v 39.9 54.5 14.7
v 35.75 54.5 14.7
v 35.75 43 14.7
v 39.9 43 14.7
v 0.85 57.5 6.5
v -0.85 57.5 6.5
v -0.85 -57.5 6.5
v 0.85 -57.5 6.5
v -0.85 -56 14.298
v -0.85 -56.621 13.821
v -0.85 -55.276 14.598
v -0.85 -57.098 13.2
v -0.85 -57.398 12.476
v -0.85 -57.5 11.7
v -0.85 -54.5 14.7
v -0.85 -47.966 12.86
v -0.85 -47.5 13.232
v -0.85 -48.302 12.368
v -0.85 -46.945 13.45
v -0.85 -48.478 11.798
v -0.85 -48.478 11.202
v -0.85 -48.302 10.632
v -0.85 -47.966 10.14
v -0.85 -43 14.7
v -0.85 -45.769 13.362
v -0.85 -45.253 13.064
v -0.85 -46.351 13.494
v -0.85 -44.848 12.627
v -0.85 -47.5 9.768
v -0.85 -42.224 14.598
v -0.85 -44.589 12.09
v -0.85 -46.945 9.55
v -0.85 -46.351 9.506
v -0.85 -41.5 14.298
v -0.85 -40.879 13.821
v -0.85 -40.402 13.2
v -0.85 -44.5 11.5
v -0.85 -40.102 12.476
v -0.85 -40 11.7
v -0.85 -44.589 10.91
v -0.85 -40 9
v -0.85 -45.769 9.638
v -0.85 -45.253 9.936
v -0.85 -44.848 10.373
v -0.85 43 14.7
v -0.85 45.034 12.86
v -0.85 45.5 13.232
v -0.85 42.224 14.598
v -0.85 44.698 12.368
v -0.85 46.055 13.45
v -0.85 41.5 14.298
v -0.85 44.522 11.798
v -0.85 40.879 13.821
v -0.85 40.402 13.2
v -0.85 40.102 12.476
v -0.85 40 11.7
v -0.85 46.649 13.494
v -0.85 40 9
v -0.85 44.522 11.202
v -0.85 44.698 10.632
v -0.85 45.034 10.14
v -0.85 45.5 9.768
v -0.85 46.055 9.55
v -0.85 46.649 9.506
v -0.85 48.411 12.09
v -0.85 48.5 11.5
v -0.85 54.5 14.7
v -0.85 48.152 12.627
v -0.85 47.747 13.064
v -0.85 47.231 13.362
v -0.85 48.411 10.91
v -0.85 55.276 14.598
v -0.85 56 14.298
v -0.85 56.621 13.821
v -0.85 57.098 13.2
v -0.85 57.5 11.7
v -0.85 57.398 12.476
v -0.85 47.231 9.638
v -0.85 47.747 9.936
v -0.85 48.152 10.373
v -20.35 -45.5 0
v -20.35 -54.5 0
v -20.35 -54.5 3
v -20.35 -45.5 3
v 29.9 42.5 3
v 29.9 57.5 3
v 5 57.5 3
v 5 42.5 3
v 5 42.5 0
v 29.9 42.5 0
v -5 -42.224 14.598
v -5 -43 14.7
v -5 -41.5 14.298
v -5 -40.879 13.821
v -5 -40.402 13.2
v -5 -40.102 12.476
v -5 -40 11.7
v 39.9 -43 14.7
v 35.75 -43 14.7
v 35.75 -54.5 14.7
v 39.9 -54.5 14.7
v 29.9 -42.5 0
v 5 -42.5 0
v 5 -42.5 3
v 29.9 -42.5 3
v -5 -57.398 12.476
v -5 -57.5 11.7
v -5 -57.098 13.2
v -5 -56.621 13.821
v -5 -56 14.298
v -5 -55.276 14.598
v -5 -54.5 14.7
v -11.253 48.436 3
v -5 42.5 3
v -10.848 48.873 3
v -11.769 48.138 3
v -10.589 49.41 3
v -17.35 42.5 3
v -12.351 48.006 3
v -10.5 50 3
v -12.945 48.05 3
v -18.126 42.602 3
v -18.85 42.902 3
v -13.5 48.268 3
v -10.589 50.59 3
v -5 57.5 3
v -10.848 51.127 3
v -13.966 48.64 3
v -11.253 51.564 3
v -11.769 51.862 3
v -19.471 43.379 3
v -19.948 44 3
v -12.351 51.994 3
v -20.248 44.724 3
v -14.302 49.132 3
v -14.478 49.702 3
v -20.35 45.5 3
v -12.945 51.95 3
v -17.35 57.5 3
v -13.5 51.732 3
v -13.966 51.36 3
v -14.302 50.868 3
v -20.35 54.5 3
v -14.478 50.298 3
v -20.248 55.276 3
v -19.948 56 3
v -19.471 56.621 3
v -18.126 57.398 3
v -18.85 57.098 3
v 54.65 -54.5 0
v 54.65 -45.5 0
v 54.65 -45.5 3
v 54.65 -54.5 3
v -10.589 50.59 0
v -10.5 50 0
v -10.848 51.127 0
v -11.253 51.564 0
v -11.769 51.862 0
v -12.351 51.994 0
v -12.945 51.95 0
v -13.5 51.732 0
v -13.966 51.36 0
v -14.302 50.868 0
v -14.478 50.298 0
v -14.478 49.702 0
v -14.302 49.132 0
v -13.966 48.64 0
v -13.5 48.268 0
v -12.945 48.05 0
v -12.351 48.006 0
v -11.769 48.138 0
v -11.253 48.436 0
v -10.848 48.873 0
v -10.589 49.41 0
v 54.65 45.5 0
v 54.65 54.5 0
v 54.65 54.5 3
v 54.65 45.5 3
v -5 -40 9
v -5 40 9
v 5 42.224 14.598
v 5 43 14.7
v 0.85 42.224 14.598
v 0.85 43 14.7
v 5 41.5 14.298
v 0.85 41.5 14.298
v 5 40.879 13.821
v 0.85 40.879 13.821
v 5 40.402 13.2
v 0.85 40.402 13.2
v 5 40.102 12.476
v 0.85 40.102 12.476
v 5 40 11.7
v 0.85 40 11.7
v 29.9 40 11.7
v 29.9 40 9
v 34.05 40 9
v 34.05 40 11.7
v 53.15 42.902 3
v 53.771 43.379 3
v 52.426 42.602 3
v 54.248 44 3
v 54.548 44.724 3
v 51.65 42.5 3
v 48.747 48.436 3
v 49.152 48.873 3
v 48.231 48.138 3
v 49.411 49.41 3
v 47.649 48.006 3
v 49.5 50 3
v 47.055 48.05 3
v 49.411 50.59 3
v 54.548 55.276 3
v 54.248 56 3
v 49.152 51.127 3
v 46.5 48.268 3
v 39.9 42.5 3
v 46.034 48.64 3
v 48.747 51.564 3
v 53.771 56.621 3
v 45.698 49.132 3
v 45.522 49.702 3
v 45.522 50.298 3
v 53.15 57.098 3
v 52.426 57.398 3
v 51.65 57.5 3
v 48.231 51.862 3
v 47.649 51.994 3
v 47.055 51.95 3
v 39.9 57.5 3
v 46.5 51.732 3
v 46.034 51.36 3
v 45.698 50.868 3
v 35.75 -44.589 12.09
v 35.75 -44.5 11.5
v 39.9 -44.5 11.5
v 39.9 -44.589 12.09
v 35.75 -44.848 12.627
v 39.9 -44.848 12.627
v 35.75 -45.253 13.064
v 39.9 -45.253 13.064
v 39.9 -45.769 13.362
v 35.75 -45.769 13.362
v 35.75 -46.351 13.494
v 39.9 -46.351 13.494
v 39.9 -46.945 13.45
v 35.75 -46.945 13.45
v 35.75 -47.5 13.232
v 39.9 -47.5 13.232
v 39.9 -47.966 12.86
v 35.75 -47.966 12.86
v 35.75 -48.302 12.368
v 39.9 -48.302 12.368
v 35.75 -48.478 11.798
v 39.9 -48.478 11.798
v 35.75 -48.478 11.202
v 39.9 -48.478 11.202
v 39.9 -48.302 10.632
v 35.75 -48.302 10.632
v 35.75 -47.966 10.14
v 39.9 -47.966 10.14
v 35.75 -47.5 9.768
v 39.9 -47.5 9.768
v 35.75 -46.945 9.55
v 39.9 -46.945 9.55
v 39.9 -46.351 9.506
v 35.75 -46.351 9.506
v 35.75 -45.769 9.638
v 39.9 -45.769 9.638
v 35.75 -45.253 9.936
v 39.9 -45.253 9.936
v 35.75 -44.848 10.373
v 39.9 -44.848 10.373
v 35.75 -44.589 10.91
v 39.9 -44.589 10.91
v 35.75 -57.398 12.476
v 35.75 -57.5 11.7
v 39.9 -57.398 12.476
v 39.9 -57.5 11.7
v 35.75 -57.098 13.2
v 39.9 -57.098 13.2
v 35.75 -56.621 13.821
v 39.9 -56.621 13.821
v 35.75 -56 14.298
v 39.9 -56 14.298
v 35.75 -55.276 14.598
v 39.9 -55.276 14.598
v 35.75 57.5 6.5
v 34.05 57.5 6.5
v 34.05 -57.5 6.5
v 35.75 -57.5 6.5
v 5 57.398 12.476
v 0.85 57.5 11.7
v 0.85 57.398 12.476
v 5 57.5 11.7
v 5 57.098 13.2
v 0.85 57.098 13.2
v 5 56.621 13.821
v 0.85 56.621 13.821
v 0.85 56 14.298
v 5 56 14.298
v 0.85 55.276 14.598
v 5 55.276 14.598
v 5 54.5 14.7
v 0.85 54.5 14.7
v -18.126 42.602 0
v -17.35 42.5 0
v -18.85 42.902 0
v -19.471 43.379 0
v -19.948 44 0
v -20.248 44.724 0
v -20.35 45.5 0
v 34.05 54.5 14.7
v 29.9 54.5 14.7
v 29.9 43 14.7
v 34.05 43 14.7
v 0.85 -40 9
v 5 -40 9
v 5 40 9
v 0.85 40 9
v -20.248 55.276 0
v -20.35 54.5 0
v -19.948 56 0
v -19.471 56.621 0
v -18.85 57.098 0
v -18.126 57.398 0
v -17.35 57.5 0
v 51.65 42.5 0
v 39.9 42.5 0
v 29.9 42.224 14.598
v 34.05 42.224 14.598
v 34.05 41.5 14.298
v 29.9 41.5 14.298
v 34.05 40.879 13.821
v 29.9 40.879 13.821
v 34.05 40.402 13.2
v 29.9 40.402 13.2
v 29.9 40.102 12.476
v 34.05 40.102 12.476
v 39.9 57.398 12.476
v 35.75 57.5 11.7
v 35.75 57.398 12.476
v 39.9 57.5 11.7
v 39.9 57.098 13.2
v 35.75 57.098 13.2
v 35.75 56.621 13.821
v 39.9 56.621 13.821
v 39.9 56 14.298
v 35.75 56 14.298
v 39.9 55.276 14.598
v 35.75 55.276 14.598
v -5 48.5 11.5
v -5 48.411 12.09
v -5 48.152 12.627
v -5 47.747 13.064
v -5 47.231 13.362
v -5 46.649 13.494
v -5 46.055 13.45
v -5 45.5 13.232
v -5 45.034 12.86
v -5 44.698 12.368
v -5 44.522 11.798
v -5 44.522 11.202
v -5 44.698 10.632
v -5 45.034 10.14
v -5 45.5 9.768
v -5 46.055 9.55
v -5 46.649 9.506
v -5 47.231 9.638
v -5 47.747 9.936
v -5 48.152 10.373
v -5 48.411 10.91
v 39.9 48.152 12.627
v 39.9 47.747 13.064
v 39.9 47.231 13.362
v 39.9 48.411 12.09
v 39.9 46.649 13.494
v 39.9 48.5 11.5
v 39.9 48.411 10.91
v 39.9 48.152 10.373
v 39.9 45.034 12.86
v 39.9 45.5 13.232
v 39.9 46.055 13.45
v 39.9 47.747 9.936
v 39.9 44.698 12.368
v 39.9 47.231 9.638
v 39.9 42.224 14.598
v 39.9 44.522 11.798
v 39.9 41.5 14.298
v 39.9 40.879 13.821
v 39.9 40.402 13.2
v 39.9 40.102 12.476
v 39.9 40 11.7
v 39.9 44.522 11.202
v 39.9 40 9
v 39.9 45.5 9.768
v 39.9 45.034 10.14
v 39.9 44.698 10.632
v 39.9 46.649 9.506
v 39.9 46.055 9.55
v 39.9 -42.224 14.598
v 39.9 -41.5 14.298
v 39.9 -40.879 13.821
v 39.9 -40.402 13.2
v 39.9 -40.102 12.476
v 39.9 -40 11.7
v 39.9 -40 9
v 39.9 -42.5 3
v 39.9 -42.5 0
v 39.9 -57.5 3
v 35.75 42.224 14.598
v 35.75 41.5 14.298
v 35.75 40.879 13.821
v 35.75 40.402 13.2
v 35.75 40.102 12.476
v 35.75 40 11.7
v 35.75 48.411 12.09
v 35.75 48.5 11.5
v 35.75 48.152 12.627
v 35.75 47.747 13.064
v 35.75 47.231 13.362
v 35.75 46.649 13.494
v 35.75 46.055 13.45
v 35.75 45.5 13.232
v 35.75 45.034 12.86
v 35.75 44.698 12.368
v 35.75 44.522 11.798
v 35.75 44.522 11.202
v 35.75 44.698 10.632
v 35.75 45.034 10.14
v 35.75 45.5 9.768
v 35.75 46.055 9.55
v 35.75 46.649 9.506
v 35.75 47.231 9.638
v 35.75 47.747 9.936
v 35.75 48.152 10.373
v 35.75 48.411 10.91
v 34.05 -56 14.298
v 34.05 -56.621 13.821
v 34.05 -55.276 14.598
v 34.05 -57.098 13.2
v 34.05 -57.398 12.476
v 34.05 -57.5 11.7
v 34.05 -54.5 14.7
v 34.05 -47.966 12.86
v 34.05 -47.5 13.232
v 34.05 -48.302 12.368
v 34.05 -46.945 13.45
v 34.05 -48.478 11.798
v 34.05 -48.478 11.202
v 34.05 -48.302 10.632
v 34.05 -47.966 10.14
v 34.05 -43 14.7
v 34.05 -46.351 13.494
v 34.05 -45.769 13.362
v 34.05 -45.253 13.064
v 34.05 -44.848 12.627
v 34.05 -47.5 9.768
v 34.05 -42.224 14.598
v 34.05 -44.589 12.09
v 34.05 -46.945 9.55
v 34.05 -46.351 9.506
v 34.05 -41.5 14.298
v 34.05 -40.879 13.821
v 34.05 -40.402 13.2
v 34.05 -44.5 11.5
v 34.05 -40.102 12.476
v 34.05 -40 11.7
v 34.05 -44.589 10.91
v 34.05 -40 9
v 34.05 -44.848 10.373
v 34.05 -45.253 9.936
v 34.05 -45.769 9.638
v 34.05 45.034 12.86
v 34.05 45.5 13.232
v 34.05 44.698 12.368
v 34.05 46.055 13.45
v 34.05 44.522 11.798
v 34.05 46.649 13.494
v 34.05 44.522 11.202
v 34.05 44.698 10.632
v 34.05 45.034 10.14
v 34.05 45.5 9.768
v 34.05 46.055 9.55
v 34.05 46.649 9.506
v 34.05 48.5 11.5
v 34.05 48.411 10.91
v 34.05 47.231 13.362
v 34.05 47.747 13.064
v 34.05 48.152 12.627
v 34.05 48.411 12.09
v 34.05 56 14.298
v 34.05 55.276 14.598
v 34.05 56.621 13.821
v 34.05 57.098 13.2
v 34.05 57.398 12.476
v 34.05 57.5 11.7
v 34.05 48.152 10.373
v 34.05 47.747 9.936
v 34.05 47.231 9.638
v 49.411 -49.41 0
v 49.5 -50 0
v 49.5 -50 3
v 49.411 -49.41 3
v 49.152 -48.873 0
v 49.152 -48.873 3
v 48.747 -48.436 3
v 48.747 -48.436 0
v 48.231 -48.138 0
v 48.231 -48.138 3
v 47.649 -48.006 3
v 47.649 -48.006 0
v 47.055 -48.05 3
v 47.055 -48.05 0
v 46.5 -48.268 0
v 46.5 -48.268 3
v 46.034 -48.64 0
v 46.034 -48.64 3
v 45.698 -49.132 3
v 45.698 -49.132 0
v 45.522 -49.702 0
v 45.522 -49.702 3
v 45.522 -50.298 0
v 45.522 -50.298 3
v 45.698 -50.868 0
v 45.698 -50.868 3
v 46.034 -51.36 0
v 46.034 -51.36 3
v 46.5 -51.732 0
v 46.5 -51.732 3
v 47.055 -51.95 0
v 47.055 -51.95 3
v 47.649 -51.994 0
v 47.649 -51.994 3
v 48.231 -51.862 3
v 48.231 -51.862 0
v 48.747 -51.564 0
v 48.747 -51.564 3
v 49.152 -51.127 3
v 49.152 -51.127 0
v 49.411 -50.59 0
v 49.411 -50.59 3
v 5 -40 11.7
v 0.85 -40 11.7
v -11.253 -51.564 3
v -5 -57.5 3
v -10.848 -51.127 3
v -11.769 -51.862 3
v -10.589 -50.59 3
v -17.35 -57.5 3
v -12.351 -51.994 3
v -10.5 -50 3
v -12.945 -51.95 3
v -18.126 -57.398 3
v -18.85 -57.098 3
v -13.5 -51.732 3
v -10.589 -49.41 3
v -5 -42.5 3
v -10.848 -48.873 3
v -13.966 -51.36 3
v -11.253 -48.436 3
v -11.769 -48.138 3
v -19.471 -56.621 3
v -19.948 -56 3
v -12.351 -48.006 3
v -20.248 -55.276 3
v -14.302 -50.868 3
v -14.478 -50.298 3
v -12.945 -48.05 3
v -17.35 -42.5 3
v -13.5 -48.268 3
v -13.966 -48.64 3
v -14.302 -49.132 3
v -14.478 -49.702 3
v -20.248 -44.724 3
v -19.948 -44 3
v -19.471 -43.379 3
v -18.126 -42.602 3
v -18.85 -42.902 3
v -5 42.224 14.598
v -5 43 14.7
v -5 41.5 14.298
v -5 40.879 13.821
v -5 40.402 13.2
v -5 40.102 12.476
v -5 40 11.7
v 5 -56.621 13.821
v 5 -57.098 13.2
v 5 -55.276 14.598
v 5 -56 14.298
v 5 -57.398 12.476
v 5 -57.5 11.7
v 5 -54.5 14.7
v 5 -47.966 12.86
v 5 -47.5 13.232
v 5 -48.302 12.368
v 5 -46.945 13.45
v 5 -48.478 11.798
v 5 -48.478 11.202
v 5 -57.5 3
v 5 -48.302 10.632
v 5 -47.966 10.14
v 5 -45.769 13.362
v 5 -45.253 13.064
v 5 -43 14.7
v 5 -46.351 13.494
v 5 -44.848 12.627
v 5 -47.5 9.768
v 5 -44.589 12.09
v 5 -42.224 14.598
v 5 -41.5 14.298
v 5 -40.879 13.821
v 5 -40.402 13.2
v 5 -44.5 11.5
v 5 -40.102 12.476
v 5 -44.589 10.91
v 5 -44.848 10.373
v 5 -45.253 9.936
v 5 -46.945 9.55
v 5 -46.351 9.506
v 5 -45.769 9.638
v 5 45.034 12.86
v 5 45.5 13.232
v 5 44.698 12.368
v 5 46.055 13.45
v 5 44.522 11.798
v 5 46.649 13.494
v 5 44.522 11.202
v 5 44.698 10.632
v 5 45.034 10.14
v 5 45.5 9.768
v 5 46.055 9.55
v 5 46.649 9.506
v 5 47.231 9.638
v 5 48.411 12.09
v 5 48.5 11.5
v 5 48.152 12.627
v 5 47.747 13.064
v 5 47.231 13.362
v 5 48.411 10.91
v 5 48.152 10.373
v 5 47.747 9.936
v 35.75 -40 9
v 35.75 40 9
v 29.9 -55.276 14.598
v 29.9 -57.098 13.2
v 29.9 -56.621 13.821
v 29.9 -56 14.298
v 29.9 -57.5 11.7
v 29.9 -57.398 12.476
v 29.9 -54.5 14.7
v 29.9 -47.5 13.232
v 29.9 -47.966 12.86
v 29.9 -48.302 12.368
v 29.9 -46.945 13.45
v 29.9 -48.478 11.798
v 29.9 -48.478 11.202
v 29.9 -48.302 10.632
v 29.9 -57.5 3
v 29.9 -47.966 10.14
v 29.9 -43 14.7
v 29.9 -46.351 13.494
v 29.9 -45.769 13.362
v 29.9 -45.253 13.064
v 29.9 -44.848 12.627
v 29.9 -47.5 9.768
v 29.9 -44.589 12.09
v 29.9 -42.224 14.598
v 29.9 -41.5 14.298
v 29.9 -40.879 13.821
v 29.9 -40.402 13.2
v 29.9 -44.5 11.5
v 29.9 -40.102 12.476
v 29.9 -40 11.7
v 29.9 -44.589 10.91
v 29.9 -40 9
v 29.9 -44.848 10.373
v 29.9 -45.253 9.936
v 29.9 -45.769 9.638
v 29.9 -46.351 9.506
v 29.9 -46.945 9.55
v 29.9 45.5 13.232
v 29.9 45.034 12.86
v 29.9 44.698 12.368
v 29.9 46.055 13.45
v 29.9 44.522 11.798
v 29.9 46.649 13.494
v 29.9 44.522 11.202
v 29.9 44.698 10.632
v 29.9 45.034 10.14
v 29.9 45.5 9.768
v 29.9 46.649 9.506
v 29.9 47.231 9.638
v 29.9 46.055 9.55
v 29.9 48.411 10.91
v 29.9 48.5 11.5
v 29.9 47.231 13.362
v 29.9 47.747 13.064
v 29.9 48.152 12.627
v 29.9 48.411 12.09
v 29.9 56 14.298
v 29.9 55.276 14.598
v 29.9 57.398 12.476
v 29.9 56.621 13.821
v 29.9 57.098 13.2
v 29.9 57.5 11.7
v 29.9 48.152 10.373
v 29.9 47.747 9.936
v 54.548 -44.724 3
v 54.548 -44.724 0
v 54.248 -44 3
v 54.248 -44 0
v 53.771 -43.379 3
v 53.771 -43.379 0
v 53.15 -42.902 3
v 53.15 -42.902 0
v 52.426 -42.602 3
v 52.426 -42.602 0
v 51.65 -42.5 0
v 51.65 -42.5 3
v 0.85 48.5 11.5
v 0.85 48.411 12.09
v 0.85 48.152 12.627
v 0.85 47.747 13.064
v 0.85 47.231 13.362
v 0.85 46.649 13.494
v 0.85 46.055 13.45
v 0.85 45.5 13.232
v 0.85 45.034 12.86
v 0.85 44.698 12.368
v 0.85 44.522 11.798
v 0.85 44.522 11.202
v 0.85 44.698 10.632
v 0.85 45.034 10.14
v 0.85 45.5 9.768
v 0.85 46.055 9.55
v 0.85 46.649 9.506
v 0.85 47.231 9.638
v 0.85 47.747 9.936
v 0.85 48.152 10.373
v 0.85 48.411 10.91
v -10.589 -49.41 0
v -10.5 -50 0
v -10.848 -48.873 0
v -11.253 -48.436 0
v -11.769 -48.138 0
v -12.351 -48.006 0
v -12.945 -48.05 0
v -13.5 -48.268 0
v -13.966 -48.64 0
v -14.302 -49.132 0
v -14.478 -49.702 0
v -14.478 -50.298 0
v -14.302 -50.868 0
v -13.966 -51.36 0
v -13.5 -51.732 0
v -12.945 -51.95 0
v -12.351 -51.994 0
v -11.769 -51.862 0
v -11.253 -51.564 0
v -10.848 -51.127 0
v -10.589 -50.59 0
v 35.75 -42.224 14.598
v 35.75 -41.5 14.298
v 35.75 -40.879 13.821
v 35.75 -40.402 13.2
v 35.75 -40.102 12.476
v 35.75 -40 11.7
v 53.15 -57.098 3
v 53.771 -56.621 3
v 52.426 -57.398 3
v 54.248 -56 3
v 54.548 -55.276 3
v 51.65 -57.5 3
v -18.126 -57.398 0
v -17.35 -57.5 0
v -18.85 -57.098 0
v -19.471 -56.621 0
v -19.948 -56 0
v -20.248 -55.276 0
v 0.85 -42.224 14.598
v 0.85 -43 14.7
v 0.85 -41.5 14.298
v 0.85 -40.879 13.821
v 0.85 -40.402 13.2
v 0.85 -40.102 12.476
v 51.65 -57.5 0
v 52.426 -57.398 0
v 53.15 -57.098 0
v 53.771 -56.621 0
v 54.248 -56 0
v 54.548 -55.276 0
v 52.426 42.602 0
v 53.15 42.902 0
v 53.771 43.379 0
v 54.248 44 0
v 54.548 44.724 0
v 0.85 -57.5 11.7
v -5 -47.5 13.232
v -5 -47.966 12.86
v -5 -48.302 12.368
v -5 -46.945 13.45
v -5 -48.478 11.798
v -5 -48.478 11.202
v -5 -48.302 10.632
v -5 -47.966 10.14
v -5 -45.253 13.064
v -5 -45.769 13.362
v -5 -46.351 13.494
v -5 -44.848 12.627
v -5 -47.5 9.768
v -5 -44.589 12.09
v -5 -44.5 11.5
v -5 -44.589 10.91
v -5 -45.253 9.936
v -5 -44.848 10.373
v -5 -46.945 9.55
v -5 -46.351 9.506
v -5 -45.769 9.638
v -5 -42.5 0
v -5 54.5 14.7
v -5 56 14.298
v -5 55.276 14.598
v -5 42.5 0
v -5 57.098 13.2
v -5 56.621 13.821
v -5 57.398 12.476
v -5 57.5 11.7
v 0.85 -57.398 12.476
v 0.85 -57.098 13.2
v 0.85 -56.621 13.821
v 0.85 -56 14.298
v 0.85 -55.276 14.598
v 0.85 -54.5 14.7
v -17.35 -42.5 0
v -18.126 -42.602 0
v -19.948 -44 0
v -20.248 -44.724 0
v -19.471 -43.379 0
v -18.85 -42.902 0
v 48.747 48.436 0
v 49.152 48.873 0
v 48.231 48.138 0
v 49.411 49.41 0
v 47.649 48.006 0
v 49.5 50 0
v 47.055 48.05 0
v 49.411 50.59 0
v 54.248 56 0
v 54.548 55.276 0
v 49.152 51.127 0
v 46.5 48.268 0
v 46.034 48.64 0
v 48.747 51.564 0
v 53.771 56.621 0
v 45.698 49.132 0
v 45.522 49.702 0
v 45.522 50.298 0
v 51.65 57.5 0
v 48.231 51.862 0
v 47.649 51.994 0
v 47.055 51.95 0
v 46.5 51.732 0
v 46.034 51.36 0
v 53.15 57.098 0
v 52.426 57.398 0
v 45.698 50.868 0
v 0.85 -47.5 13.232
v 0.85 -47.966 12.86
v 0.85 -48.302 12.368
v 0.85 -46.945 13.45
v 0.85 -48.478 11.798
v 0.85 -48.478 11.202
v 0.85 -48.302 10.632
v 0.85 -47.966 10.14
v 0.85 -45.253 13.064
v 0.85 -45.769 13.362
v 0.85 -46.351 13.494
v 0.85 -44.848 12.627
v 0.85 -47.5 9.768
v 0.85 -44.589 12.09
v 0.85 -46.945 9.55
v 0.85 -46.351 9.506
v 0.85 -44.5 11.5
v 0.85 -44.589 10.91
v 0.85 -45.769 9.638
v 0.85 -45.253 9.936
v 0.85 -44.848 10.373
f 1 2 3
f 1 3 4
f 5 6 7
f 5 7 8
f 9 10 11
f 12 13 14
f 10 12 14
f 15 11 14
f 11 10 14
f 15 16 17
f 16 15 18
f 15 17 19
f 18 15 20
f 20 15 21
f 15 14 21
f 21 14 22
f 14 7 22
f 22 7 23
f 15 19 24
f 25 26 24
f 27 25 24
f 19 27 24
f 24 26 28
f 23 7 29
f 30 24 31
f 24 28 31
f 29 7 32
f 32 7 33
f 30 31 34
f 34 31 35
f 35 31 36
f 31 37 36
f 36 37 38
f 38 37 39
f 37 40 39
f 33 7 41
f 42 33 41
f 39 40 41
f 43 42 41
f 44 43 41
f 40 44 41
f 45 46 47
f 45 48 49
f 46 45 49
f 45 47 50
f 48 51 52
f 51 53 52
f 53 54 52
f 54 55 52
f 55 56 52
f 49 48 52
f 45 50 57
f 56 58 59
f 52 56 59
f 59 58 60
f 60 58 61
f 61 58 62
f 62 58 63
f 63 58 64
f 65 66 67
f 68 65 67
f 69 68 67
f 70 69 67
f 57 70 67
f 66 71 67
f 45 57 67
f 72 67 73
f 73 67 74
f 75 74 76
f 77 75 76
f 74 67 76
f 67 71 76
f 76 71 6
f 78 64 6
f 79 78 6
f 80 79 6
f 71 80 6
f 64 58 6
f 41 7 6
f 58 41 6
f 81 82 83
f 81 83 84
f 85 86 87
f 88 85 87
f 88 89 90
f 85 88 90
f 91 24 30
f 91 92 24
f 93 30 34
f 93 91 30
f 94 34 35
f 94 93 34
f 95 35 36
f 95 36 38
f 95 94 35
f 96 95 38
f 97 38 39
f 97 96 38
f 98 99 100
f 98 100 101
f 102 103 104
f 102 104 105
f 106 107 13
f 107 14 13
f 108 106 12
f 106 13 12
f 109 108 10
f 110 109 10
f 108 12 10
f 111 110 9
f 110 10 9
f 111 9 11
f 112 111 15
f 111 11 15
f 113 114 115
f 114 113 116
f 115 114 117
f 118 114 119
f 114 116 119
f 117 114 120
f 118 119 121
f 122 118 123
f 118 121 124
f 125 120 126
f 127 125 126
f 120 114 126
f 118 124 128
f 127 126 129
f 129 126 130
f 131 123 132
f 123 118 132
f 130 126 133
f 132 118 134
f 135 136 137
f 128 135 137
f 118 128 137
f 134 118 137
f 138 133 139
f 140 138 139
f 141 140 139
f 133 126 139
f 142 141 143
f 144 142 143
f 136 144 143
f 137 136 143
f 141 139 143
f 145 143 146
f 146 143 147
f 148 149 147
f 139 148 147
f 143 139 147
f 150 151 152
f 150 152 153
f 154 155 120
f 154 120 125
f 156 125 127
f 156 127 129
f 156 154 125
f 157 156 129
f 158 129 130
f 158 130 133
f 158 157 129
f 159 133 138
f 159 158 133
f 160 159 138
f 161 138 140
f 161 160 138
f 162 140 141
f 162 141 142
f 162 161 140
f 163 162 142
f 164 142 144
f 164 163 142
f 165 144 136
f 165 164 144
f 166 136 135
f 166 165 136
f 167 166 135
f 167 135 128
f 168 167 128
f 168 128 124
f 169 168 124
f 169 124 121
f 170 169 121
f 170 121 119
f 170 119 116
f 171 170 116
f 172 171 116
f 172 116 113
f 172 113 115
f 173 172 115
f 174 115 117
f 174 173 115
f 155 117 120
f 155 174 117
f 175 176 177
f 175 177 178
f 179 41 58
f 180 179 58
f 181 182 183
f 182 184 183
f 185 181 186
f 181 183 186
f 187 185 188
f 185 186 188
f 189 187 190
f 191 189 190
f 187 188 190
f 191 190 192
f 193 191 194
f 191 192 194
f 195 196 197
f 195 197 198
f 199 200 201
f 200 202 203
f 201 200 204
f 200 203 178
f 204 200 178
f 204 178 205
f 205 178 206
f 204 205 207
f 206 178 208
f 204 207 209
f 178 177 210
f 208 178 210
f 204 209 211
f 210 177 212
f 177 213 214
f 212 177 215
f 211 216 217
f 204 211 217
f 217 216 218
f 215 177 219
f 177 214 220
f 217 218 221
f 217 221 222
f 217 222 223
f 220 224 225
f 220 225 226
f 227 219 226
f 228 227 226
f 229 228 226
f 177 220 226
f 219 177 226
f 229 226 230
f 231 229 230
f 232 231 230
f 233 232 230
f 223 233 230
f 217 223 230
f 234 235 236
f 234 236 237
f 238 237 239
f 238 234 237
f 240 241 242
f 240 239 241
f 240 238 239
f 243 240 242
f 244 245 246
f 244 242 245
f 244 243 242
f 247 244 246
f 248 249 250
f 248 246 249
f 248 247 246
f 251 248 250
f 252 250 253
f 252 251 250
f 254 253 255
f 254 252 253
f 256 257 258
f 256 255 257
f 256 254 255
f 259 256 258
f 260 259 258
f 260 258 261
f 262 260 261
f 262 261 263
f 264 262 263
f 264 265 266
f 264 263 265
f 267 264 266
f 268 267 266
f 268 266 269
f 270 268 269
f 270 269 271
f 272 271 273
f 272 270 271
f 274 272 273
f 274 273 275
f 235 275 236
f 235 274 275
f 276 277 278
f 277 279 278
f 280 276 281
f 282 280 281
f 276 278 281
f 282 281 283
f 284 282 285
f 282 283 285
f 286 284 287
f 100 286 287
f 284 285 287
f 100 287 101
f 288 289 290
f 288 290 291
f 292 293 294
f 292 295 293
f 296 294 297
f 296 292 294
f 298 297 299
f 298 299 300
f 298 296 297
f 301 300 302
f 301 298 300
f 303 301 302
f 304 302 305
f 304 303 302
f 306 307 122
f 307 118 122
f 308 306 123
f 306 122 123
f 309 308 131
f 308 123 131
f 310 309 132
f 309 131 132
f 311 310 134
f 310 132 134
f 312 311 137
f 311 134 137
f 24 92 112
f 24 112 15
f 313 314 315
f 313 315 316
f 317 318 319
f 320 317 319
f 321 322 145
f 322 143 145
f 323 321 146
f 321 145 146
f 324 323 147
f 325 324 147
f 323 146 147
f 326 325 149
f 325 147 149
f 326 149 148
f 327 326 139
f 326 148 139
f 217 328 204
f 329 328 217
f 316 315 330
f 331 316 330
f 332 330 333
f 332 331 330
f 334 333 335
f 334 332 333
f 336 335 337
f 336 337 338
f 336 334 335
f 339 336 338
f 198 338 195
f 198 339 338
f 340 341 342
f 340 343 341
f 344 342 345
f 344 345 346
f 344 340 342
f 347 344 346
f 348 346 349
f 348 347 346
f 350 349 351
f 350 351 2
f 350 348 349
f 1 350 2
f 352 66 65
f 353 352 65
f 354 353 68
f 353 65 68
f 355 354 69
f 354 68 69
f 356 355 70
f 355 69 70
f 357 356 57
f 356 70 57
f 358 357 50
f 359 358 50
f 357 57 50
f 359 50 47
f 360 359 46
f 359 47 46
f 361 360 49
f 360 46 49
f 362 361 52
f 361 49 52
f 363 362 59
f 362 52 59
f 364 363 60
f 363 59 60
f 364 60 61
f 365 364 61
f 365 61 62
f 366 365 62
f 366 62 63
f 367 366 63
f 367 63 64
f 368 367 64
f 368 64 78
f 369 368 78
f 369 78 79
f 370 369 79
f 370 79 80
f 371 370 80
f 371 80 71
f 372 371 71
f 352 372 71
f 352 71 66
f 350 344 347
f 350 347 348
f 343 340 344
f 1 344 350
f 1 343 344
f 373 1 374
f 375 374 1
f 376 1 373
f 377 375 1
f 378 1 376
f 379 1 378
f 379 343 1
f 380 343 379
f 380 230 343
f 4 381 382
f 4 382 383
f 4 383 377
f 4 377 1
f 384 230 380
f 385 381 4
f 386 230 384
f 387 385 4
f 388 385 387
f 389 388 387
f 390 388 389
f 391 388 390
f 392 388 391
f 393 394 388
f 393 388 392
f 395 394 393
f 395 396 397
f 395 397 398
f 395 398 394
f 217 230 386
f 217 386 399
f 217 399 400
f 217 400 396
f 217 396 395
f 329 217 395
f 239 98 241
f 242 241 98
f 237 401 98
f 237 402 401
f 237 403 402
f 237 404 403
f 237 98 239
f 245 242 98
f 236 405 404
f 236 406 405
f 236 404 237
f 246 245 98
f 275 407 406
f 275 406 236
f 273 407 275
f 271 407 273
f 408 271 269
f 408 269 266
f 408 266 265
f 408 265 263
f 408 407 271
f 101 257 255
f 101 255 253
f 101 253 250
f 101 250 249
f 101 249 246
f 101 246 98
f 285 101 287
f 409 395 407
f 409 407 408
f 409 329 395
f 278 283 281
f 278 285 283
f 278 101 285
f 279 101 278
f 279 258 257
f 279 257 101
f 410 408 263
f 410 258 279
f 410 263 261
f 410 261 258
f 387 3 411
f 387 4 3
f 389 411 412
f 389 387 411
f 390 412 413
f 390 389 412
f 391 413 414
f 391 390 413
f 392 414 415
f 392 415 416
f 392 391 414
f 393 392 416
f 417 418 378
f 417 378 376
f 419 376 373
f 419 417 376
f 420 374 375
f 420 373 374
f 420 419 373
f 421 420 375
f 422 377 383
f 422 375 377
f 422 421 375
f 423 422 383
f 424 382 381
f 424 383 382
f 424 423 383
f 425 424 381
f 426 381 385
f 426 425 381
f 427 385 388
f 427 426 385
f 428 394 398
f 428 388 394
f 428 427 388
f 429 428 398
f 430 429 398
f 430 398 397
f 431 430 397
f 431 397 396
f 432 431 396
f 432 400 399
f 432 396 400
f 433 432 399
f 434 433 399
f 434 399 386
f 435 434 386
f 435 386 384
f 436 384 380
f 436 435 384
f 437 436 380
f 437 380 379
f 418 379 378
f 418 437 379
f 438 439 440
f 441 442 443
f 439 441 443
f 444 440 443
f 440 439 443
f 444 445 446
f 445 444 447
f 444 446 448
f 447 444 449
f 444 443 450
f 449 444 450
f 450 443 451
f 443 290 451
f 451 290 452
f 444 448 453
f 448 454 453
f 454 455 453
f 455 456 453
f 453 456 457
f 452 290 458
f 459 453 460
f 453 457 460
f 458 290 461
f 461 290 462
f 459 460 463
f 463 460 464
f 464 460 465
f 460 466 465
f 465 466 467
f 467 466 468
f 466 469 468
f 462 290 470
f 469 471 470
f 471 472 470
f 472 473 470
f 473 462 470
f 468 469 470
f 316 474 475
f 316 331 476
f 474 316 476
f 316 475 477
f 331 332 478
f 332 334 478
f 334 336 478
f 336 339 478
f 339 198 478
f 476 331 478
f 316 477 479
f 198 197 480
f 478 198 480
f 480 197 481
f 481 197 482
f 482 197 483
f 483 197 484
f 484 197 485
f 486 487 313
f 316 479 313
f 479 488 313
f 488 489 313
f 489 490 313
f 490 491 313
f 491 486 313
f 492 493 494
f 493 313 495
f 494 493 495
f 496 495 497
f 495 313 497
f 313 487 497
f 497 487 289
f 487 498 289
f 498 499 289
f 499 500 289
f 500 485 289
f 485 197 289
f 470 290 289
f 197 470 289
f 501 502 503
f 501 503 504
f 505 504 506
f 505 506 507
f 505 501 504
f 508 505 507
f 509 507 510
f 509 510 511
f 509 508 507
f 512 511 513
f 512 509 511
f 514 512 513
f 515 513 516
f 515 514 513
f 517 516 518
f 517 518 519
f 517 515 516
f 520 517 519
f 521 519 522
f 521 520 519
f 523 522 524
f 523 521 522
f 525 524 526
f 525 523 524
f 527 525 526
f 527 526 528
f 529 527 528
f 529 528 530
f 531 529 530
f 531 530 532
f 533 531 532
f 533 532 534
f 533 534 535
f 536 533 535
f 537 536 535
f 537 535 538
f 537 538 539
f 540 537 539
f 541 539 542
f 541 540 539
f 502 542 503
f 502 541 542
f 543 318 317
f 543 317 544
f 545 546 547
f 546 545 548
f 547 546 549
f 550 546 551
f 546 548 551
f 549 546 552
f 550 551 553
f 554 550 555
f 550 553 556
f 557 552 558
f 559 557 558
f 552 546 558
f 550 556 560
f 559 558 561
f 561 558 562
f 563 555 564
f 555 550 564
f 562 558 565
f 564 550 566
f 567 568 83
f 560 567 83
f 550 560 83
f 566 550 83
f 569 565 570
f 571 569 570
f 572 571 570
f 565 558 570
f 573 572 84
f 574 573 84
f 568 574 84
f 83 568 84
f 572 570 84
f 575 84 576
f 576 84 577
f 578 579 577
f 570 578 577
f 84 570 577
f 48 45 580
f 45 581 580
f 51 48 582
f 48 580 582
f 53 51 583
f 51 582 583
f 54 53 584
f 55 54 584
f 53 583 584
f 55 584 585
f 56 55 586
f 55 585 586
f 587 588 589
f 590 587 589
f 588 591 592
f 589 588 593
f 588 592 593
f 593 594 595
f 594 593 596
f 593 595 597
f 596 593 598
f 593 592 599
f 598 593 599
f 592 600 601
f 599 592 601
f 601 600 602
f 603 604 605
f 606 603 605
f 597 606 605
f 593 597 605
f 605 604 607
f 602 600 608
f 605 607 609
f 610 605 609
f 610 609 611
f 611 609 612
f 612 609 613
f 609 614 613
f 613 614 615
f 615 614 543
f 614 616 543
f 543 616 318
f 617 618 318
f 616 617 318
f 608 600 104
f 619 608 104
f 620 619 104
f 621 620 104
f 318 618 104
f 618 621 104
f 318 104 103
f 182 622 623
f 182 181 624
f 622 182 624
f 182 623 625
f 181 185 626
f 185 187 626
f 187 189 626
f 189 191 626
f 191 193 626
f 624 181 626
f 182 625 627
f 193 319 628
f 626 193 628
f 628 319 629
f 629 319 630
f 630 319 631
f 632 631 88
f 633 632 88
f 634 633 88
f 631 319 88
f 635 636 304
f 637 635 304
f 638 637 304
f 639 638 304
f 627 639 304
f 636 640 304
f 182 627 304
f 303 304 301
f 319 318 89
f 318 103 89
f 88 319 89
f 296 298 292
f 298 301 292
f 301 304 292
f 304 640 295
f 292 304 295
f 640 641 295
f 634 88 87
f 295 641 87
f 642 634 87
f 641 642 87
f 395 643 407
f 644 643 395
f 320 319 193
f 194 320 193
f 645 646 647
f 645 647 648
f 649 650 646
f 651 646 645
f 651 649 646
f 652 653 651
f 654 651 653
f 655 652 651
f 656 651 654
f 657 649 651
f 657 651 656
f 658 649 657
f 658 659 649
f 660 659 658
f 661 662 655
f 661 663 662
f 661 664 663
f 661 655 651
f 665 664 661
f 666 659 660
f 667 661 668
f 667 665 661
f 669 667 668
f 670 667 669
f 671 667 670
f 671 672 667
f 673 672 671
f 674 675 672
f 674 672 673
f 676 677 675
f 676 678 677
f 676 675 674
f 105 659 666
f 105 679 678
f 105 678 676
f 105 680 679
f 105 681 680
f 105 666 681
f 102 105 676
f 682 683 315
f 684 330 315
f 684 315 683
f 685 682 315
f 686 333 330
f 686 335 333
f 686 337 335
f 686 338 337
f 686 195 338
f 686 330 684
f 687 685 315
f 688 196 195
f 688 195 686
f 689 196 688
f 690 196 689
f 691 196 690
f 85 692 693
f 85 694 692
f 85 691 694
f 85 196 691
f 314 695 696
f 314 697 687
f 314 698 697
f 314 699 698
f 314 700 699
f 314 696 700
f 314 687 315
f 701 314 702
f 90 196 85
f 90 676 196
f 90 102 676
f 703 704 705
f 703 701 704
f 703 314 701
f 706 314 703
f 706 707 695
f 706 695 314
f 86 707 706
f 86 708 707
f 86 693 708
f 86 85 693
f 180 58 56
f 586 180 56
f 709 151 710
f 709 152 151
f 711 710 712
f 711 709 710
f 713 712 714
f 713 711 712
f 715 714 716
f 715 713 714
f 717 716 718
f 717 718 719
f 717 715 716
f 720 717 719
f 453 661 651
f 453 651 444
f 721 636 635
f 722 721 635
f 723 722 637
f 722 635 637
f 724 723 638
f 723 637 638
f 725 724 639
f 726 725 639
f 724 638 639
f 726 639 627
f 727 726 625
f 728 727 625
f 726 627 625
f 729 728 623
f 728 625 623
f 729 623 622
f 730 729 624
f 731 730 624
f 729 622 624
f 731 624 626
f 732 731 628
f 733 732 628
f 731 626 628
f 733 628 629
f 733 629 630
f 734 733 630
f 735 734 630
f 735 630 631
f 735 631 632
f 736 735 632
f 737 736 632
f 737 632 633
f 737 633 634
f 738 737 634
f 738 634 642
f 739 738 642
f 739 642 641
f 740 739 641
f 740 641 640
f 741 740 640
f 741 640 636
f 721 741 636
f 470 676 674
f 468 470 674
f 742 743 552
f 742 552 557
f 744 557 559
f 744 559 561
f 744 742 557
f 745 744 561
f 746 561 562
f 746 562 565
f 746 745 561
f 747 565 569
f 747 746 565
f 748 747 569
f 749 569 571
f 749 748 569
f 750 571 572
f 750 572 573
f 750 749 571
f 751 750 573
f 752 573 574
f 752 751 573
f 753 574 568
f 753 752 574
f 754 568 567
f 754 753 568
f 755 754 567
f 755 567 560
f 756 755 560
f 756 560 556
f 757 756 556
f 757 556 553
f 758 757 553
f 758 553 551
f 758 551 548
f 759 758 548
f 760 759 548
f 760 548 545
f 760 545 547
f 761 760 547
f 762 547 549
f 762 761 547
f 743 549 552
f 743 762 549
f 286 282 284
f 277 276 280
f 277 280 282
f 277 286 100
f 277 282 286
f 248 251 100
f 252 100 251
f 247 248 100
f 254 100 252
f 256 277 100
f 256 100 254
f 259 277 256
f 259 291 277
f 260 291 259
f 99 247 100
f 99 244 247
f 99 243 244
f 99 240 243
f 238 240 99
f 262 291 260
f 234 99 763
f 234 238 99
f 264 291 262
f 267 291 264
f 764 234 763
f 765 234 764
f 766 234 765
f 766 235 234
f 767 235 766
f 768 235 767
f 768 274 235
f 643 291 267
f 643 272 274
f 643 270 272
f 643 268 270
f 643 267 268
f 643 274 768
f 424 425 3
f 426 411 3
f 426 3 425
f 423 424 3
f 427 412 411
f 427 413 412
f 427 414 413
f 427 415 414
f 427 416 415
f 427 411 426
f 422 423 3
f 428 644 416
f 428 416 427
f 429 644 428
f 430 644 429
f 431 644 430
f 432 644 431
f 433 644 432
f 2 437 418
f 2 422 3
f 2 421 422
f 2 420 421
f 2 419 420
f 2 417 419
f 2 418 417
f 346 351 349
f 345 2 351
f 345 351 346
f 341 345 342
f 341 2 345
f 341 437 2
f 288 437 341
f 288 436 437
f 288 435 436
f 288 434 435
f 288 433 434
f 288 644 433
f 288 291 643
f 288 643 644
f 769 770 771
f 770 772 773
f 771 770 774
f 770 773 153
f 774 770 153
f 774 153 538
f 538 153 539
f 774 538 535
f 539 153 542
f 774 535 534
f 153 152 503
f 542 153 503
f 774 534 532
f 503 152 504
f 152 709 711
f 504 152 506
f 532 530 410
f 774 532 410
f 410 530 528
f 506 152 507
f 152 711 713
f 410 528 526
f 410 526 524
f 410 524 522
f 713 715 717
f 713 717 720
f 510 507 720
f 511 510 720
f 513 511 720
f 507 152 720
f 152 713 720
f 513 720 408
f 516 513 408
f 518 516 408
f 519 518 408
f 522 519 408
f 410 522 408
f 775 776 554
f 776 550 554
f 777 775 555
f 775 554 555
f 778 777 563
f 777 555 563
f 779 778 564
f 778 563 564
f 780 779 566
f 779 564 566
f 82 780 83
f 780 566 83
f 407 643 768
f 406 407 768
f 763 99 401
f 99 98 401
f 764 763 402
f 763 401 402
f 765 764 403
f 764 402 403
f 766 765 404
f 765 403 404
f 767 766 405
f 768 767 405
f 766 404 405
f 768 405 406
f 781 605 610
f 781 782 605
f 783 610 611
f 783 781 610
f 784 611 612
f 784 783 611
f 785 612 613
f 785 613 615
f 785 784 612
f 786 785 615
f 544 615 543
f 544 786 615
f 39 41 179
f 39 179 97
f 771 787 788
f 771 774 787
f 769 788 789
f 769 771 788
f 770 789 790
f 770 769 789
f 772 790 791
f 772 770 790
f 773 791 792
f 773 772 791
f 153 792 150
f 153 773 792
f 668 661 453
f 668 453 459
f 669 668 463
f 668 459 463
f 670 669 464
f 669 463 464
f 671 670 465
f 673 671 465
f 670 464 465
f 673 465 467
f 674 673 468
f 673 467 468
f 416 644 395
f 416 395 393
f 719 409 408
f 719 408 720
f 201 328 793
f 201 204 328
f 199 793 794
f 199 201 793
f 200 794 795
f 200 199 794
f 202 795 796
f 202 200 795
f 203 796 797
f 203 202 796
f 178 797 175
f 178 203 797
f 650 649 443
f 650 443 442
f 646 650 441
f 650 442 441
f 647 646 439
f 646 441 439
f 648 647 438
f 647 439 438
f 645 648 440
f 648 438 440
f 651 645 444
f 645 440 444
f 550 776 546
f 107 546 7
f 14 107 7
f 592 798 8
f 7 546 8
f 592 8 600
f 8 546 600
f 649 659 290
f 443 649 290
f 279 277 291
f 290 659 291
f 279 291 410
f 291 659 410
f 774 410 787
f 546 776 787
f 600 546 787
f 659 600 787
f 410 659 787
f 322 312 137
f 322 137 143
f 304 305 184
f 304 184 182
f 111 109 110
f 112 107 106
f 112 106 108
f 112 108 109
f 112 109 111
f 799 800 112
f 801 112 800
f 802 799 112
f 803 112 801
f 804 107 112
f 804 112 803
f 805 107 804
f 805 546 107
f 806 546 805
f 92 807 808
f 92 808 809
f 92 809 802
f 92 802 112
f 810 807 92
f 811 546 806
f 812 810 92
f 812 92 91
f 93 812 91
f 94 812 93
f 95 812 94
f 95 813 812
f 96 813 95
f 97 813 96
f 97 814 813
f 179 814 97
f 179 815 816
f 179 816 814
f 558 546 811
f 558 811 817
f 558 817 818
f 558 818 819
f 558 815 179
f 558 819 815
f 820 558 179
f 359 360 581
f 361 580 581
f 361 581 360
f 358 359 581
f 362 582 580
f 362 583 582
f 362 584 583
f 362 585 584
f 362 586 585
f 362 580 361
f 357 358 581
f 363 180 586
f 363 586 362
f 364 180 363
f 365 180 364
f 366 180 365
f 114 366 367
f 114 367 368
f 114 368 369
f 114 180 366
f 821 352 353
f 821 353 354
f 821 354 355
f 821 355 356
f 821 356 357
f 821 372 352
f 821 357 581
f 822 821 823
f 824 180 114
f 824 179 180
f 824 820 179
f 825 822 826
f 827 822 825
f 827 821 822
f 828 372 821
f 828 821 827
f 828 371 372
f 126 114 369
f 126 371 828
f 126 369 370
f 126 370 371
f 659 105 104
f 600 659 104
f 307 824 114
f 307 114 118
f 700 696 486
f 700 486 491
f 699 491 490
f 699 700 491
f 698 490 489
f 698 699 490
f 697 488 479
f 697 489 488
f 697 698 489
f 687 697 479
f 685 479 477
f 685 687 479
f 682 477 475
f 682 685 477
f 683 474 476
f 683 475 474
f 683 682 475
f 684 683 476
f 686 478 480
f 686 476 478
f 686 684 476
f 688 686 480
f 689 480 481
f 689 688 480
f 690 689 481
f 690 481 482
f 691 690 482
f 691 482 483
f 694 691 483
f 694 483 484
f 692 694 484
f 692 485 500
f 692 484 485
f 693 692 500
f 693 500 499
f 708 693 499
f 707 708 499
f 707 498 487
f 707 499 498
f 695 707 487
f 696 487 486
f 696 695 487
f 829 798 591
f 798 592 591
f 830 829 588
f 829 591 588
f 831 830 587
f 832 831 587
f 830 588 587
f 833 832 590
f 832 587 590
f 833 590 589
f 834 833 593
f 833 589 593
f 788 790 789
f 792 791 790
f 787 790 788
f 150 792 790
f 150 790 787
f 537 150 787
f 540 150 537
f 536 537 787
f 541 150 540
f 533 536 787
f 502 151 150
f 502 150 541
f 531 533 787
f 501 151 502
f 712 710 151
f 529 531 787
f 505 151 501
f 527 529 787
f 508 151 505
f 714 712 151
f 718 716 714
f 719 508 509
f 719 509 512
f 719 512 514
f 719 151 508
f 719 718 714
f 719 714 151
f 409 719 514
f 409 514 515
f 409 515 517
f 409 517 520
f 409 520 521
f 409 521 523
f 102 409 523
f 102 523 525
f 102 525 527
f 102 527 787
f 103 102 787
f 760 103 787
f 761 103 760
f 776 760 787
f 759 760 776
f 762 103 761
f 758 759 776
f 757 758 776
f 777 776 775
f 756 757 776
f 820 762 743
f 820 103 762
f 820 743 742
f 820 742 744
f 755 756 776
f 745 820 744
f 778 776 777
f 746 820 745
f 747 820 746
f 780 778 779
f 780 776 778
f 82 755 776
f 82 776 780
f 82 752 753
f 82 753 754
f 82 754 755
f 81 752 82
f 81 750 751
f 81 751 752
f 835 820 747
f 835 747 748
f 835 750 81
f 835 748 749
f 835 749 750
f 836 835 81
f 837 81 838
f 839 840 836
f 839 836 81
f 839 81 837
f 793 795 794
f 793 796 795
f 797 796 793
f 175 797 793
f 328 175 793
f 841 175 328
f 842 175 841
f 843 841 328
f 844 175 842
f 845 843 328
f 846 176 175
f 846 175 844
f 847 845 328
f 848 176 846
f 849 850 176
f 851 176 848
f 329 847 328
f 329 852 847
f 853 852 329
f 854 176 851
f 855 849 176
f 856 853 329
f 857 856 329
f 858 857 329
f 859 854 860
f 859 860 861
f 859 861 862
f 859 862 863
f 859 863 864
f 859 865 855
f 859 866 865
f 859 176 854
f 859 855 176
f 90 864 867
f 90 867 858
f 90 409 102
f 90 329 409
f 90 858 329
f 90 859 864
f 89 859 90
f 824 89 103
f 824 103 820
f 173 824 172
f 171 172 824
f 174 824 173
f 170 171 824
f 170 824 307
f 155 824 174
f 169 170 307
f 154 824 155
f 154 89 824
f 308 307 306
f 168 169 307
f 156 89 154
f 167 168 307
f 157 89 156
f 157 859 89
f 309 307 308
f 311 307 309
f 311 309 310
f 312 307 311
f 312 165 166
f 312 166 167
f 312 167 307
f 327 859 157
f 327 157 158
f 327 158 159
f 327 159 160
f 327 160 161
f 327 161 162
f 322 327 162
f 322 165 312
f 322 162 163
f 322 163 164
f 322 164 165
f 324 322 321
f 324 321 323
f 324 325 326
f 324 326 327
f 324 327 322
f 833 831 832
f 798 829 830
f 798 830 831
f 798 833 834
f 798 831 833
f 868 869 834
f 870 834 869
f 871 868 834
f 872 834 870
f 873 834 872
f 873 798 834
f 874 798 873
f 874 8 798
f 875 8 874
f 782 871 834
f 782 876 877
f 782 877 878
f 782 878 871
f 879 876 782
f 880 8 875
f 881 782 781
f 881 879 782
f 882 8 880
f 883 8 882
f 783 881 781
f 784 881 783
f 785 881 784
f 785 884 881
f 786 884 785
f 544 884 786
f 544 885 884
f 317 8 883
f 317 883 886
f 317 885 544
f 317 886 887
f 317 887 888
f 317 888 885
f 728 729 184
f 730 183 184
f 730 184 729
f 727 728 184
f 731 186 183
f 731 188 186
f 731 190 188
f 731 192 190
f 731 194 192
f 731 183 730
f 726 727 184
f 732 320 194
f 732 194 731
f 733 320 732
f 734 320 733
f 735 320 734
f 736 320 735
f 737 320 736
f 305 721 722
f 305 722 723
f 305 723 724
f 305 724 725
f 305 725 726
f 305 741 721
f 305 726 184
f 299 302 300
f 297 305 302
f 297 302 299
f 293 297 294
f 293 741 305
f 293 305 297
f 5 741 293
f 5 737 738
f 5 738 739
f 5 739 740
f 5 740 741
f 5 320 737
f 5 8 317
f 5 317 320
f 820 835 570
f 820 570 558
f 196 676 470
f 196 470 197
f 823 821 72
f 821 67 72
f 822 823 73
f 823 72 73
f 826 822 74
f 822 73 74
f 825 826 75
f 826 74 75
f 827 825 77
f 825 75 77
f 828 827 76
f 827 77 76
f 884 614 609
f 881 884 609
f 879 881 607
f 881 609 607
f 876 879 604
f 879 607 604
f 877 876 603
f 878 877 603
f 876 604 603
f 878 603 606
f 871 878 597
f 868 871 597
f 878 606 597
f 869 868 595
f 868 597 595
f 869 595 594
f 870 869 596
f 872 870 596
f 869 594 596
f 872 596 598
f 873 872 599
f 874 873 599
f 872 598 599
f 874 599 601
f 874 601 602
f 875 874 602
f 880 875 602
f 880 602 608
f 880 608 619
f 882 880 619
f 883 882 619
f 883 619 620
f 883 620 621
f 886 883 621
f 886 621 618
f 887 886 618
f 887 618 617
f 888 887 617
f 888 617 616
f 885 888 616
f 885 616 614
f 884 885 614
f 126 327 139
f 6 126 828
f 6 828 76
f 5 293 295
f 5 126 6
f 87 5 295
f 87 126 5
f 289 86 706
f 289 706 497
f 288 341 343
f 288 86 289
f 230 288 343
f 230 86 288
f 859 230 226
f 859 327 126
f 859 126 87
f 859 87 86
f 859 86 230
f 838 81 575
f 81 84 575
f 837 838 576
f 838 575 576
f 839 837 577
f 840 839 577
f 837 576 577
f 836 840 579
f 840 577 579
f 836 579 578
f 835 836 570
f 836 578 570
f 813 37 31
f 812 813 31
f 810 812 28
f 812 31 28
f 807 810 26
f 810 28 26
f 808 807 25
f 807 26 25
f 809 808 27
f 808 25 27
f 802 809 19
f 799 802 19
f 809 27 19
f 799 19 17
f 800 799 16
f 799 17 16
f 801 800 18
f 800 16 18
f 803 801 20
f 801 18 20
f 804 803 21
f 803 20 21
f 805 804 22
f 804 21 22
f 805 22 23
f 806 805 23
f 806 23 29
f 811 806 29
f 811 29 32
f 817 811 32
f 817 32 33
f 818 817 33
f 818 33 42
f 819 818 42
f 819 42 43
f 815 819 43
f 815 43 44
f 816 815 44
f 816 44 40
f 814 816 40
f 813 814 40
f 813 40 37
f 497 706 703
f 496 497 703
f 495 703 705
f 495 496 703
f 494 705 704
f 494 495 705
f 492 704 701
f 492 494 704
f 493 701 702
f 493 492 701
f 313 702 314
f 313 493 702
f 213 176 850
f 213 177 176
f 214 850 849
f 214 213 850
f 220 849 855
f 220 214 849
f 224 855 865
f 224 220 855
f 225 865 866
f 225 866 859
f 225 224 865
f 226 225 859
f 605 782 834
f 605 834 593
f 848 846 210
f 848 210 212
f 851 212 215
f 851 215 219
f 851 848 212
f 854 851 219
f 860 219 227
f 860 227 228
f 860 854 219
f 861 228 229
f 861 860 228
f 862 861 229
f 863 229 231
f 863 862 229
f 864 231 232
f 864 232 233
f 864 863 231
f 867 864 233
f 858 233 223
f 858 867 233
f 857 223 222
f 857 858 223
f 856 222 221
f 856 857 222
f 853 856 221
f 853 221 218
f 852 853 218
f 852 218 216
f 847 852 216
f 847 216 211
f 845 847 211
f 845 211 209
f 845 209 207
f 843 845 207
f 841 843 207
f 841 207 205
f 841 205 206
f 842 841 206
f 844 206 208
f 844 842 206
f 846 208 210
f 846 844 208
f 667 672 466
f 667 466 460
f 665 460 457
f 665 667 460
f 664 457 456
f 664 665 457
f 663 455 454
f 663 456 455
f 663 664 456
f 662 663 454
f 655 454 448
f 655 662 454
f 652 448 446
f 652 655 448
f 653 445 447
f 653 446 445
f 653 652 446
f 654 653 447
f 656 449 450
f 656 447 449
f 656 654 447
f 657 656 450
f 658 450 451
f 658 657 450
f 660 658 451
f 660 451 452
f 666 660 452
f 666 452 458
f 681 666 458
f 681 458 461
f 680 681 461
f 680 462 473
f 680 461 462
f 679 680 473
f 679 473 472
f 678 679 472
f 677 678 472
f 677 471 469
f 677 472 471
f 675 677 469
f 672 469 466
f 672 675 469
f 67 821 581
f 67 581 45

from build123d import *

# Parameters (mm, degrees)
SKETCH_R          = 2
SKETCH_W          = 24.9
SKETCH_H          = 85
PAD_DEPTH         = 3
SKETCH001_W       = 4.15
SKETCH001_H       = 115
PAD001_DEPTH      = 11.7
SKETCH002_R       = 2
SKETCH002_W       = 80
SKETCH002_H       = 6
POCKET_DEPTH      = 50
POCKET_DEPTH_BACK = -100
SKETCH003_W       = 4
SKETCH003_H       = 115
PAD002_DEPTH      = 3.5
FILLET_R          = 3
FILLET001_R       = 3
FILLET002_R       = 3
FILLET003_R       = 3
FILLET004_R       = 3
FILLET005_R       = 3
FILLET006_R       = 3
FILLET007_R       = 3
FILLET008_R       = 3
FILLET009_R       = 3
FILLET010_R       = 3
FILLET011_R       = 3
FILLET012_R       = 3
FILLET013_R       = 3
FILLET014_R       = 3
FILLET015_R       = 3
FILLET016_R       = 3
FILLET017_R       = 3
FILLET018_R       = 3
FILLET019_R       = 3
FILLET020_R       = 3
FILLET021_R       = 3
FILLET022_R       = 3
FILLET023_R       = 3


with BuildPart() as part:
    # Sketch → Pad (new body)
    with BuildSketch(Plane.XY):
        Polygon((54.65, -57.5), (-20.35, -57.5), (-20.35, -42.5), (-5, -42.5), (-5, 42.5), (-20.35, 42.5), (-20.35, 57.5), (54.65, 57.5), (54.65, 42.5), (39.9, 42.5), (39.9, -42.5), (54.65, -42.5), align=None)
        with Locations((-12.5, 50)):
            Circle(SKETCH_R, mode=Mode.SUBTRACT)
        with Locations((47.5, 50)):
            Circle(SKETCH_R, mode=Mode.SUBTRACT)
        with Locations((-12.5, -50)):
            Circle(SKETCH_R, mode=Mode.SUBTRACT)
        with Locations((47.5, -50)):
            Circle(SKETCH_R, mode=Mode.SUBTRACT)
        with Locations((17.45, 0)):
            Rectangle(SKETCH_W, SKETCH_H, mode=Mode.SUBTRACT)
    extrude(amount=PAD_DEPTH)

    # Sketch001 → Pad001 (join)
    with BuildSketch(Plane.XY.offset(3)):
        with Locations((-2.925, 0)):
            Rectangle(SKETCH001_W, SKETCH001_H)
        with Locations((2.925, 0)):
            Rectangle(SKETCH001_W, SKETCH001_H)
        with Locations((31.975, 0)):
            Rectangle(SKETCH001_W, SKETCH001_H)
        with Locations((37.825, 0)):
            Rectangle(SKETCH001_W, SKETCH001_H)
    extrude(amount=PAD001_DEPTH)

    # Sketch002 → Pocket (cut, two sides)
    with BuildSketch(Plane.YZ.offset(5)) as pocket_sk:
        with Locations((-46.5, 11.5)):
            Circle(SKETCH002_R)
        with Locations((46.5, 11.5)):
            Circle(SKETCH002_R)
        with Locations((0, 12)):
            Rectangle(SKETCH002_W, SKETCH002_H)
    extrude(amount=-POCKET_DEPTH, mode=Mode.SUBTRACT)
    extrude(pocket_sk.sketch, amount=-POCKET_DEPTH_BACK, mode=Mode.SUBTRACT)

    # Sketch003 → Pad002 (join)
    with BuildSketch(Plane.XY.offset(3)):
        Rectangle(SKETCH003_W, SKETCH003_H)
        with Locations((35.05, 0)):
            Rectangle(SKETCH003_W, SKETCH003_H)
    extrude(amount=PAD002_DEPTH)

    # Fillet
    fillet_edges = [part.edges().sort_by_distance(p)[0] for p in [
        (-2.925, -57.5, 14.7),
    ]]
    fillet(fillet_edges, radius=FILLET_R)

    # Fillet001
    fillet001_edges = [part.edges().sort_by_distance(p)[0] for p in [
        (2.925, -57.5, 14.7),
    ]]
    fillet(fillet001_edges, radius=FILLET001_R)

    # Fillet002
    fillet002_edges = [part.edges().sort_by_distance(p)[0] for p in [
        (31.975, -57.5, 14.7),
    ]]
    fillet(fillet002_edges, radius=FILLET002_R)

    # Fillet003
    fillet003_edges = [part.edges().sort_by_distance(p)[0] for p in [
        (37.825, -57.5, 14.7),
    ]]
    fillet(fillet003_edges, radius=FILLET003_R)

    # Fillet004
    fillet004_edges = [part.edges().sort_by_distance(p)[0] for p in [
        (37.825, -40, 14.7),
    ]]
    fillet(fillet004_edges, radius=FILLET004_R)

    # Fillet005
    fillet005_edges = [part.edges().sort_by_distance(p)[0] for p in [
        (31.975, -40, 14.7),
    ]]
    fillet(fillet005_edges, radius=FILLET005_R)

    # Fillet006
    fillet006_edges = [part.edges().sort_by_distance(p)[0] for p in [
        (-2.925, -40, 14.7),
    ]]
    fillet(fillet006_edges, radius=FILLET006_R)

    # Fillet007
    fillet007_edges = [part.edges().sort_by_distance(p)[0] for p in [
        (2.925, -40, 14.7),
    ]]
    fillet(fillet007_edges, radius=FILLET007_R)

    # Fillet008
    fillet008_edges = [part.edges().sort_by_distance(p)[0] for p in [
        (54.65, -57.5, 1.5),
    ]]
    fillet(fillet008_edges, radius=FILLET008_R)

    # Fillet009
    fillet009_edges = [part.edges().sort_by_distance(p)[0] for p in [
        (54.65, -42.5, 1.5),
    ]]
    fillet(fillet009_edges, radius=FILLET009_R)

    # Fillet010
    fillet010_edges = [part.edges().sort_by_distance(p)[0] for p in [
        (54.65, 42.5, 1.5),
    ]]
    fillet(fillet010_edges, radius=FILLET010_R)

    # Fillet011
    fillet011_edges = [part.edges().sort_by_distance(p)[0] for p in [
        (54.65, 57.5, 1.5),
    ]]
    fillet(fillet011_edges, radius=FILLET011_R)

    # Fillet012
    fillet012_edges = [part.edges().sort_by_distance(p)[0] for p in [
        (37.825, 40, 14.7),
    ]]
    fillet(fillet012_edges, radius=FILLET012_R)

    # Fillet013
    fillet013_edges = [part.edges().sort_by_distance(p)[0] for p in [
        (31.975, 40, 14.7),
    ]]
    fillet(fillet013_edges, radius=FILLET013_R)

    # Fillet014
    fillet014_edges = [part.edges().sort_by_distance(p)[0] for p in [
        (37.825, 57.5, 14.7),
    ]]
    fillet(fillet014_edges, radius=FILLET014_R)

    # Fillet015
    fillet015_edges = [part.edges().sort_by_distance(p)[0] for p in [
        (31.975, 57.5, 14.7),
    ]]
    fillet(fillet015_edges, radius=FILLET015_R)

    # Fillet016
    fillet016_edges = [part.edges().sort_by_distance(p)[0] for p in [
        (2.925, 40, 14.7),
    ]]
    fillet(fillet016_edges, radius=FILLET016_R)

    # Fillet017
    fillet017_edges = [part.edges().sort_by_distance(p)[0] for p in [
        (-2.925, 40, 14.7),
    ]]
    fillet(fillet017_edges, radius=FILLET017_R)

    # Fillet018
    fillet018_edges = [part.edges().sort_by_distance(p)[0] for p in [
        (-2.925, 57.5, 14.7),
    ]]
    fillet(fillet018_edges, radius=FILLET018_R)

    # Fillet019
    fillet019_edges = [part.edges().sort_by_distance(p)[0] for p in [
        (2.925, 57.5, 14.7),
    ]]
    fillet(fillet019_edges, radius=FILLET019_R)

    # Fillet020
    fillet020_edges = [part.edges().sort_by_distance(p)[0] for p in [
        (-20.35, -57.5, 1.5),
    ]]
    fillet(fillet020_edges, radius=FILLET020_R)

    # Fillet021
    fillet021_edges = [part.edges().sort_by_distance(p)[0] for p in [
        (-20.35, -42.5, 1.5),
    ]]
    fillet(fillet021_edges, radius=FILLET021_R)

    # Fillet022
    fillet022_edges = [part.edges().sort_by_distance(p)[0] for p in [
        (-20.35, 42.5, 1.5),
    ]]
    fillet(fillet022_edges, radius=FILLET022_R)

    # Fillet023
    fillet023_edges = [part.edges().sort_by_distance(p)[0] for p in [
        (-20.35, 57.5, 1.5),
    ]]
    fillet(fillet023_edges, radius=FILLET023_R)


solid = part.part
